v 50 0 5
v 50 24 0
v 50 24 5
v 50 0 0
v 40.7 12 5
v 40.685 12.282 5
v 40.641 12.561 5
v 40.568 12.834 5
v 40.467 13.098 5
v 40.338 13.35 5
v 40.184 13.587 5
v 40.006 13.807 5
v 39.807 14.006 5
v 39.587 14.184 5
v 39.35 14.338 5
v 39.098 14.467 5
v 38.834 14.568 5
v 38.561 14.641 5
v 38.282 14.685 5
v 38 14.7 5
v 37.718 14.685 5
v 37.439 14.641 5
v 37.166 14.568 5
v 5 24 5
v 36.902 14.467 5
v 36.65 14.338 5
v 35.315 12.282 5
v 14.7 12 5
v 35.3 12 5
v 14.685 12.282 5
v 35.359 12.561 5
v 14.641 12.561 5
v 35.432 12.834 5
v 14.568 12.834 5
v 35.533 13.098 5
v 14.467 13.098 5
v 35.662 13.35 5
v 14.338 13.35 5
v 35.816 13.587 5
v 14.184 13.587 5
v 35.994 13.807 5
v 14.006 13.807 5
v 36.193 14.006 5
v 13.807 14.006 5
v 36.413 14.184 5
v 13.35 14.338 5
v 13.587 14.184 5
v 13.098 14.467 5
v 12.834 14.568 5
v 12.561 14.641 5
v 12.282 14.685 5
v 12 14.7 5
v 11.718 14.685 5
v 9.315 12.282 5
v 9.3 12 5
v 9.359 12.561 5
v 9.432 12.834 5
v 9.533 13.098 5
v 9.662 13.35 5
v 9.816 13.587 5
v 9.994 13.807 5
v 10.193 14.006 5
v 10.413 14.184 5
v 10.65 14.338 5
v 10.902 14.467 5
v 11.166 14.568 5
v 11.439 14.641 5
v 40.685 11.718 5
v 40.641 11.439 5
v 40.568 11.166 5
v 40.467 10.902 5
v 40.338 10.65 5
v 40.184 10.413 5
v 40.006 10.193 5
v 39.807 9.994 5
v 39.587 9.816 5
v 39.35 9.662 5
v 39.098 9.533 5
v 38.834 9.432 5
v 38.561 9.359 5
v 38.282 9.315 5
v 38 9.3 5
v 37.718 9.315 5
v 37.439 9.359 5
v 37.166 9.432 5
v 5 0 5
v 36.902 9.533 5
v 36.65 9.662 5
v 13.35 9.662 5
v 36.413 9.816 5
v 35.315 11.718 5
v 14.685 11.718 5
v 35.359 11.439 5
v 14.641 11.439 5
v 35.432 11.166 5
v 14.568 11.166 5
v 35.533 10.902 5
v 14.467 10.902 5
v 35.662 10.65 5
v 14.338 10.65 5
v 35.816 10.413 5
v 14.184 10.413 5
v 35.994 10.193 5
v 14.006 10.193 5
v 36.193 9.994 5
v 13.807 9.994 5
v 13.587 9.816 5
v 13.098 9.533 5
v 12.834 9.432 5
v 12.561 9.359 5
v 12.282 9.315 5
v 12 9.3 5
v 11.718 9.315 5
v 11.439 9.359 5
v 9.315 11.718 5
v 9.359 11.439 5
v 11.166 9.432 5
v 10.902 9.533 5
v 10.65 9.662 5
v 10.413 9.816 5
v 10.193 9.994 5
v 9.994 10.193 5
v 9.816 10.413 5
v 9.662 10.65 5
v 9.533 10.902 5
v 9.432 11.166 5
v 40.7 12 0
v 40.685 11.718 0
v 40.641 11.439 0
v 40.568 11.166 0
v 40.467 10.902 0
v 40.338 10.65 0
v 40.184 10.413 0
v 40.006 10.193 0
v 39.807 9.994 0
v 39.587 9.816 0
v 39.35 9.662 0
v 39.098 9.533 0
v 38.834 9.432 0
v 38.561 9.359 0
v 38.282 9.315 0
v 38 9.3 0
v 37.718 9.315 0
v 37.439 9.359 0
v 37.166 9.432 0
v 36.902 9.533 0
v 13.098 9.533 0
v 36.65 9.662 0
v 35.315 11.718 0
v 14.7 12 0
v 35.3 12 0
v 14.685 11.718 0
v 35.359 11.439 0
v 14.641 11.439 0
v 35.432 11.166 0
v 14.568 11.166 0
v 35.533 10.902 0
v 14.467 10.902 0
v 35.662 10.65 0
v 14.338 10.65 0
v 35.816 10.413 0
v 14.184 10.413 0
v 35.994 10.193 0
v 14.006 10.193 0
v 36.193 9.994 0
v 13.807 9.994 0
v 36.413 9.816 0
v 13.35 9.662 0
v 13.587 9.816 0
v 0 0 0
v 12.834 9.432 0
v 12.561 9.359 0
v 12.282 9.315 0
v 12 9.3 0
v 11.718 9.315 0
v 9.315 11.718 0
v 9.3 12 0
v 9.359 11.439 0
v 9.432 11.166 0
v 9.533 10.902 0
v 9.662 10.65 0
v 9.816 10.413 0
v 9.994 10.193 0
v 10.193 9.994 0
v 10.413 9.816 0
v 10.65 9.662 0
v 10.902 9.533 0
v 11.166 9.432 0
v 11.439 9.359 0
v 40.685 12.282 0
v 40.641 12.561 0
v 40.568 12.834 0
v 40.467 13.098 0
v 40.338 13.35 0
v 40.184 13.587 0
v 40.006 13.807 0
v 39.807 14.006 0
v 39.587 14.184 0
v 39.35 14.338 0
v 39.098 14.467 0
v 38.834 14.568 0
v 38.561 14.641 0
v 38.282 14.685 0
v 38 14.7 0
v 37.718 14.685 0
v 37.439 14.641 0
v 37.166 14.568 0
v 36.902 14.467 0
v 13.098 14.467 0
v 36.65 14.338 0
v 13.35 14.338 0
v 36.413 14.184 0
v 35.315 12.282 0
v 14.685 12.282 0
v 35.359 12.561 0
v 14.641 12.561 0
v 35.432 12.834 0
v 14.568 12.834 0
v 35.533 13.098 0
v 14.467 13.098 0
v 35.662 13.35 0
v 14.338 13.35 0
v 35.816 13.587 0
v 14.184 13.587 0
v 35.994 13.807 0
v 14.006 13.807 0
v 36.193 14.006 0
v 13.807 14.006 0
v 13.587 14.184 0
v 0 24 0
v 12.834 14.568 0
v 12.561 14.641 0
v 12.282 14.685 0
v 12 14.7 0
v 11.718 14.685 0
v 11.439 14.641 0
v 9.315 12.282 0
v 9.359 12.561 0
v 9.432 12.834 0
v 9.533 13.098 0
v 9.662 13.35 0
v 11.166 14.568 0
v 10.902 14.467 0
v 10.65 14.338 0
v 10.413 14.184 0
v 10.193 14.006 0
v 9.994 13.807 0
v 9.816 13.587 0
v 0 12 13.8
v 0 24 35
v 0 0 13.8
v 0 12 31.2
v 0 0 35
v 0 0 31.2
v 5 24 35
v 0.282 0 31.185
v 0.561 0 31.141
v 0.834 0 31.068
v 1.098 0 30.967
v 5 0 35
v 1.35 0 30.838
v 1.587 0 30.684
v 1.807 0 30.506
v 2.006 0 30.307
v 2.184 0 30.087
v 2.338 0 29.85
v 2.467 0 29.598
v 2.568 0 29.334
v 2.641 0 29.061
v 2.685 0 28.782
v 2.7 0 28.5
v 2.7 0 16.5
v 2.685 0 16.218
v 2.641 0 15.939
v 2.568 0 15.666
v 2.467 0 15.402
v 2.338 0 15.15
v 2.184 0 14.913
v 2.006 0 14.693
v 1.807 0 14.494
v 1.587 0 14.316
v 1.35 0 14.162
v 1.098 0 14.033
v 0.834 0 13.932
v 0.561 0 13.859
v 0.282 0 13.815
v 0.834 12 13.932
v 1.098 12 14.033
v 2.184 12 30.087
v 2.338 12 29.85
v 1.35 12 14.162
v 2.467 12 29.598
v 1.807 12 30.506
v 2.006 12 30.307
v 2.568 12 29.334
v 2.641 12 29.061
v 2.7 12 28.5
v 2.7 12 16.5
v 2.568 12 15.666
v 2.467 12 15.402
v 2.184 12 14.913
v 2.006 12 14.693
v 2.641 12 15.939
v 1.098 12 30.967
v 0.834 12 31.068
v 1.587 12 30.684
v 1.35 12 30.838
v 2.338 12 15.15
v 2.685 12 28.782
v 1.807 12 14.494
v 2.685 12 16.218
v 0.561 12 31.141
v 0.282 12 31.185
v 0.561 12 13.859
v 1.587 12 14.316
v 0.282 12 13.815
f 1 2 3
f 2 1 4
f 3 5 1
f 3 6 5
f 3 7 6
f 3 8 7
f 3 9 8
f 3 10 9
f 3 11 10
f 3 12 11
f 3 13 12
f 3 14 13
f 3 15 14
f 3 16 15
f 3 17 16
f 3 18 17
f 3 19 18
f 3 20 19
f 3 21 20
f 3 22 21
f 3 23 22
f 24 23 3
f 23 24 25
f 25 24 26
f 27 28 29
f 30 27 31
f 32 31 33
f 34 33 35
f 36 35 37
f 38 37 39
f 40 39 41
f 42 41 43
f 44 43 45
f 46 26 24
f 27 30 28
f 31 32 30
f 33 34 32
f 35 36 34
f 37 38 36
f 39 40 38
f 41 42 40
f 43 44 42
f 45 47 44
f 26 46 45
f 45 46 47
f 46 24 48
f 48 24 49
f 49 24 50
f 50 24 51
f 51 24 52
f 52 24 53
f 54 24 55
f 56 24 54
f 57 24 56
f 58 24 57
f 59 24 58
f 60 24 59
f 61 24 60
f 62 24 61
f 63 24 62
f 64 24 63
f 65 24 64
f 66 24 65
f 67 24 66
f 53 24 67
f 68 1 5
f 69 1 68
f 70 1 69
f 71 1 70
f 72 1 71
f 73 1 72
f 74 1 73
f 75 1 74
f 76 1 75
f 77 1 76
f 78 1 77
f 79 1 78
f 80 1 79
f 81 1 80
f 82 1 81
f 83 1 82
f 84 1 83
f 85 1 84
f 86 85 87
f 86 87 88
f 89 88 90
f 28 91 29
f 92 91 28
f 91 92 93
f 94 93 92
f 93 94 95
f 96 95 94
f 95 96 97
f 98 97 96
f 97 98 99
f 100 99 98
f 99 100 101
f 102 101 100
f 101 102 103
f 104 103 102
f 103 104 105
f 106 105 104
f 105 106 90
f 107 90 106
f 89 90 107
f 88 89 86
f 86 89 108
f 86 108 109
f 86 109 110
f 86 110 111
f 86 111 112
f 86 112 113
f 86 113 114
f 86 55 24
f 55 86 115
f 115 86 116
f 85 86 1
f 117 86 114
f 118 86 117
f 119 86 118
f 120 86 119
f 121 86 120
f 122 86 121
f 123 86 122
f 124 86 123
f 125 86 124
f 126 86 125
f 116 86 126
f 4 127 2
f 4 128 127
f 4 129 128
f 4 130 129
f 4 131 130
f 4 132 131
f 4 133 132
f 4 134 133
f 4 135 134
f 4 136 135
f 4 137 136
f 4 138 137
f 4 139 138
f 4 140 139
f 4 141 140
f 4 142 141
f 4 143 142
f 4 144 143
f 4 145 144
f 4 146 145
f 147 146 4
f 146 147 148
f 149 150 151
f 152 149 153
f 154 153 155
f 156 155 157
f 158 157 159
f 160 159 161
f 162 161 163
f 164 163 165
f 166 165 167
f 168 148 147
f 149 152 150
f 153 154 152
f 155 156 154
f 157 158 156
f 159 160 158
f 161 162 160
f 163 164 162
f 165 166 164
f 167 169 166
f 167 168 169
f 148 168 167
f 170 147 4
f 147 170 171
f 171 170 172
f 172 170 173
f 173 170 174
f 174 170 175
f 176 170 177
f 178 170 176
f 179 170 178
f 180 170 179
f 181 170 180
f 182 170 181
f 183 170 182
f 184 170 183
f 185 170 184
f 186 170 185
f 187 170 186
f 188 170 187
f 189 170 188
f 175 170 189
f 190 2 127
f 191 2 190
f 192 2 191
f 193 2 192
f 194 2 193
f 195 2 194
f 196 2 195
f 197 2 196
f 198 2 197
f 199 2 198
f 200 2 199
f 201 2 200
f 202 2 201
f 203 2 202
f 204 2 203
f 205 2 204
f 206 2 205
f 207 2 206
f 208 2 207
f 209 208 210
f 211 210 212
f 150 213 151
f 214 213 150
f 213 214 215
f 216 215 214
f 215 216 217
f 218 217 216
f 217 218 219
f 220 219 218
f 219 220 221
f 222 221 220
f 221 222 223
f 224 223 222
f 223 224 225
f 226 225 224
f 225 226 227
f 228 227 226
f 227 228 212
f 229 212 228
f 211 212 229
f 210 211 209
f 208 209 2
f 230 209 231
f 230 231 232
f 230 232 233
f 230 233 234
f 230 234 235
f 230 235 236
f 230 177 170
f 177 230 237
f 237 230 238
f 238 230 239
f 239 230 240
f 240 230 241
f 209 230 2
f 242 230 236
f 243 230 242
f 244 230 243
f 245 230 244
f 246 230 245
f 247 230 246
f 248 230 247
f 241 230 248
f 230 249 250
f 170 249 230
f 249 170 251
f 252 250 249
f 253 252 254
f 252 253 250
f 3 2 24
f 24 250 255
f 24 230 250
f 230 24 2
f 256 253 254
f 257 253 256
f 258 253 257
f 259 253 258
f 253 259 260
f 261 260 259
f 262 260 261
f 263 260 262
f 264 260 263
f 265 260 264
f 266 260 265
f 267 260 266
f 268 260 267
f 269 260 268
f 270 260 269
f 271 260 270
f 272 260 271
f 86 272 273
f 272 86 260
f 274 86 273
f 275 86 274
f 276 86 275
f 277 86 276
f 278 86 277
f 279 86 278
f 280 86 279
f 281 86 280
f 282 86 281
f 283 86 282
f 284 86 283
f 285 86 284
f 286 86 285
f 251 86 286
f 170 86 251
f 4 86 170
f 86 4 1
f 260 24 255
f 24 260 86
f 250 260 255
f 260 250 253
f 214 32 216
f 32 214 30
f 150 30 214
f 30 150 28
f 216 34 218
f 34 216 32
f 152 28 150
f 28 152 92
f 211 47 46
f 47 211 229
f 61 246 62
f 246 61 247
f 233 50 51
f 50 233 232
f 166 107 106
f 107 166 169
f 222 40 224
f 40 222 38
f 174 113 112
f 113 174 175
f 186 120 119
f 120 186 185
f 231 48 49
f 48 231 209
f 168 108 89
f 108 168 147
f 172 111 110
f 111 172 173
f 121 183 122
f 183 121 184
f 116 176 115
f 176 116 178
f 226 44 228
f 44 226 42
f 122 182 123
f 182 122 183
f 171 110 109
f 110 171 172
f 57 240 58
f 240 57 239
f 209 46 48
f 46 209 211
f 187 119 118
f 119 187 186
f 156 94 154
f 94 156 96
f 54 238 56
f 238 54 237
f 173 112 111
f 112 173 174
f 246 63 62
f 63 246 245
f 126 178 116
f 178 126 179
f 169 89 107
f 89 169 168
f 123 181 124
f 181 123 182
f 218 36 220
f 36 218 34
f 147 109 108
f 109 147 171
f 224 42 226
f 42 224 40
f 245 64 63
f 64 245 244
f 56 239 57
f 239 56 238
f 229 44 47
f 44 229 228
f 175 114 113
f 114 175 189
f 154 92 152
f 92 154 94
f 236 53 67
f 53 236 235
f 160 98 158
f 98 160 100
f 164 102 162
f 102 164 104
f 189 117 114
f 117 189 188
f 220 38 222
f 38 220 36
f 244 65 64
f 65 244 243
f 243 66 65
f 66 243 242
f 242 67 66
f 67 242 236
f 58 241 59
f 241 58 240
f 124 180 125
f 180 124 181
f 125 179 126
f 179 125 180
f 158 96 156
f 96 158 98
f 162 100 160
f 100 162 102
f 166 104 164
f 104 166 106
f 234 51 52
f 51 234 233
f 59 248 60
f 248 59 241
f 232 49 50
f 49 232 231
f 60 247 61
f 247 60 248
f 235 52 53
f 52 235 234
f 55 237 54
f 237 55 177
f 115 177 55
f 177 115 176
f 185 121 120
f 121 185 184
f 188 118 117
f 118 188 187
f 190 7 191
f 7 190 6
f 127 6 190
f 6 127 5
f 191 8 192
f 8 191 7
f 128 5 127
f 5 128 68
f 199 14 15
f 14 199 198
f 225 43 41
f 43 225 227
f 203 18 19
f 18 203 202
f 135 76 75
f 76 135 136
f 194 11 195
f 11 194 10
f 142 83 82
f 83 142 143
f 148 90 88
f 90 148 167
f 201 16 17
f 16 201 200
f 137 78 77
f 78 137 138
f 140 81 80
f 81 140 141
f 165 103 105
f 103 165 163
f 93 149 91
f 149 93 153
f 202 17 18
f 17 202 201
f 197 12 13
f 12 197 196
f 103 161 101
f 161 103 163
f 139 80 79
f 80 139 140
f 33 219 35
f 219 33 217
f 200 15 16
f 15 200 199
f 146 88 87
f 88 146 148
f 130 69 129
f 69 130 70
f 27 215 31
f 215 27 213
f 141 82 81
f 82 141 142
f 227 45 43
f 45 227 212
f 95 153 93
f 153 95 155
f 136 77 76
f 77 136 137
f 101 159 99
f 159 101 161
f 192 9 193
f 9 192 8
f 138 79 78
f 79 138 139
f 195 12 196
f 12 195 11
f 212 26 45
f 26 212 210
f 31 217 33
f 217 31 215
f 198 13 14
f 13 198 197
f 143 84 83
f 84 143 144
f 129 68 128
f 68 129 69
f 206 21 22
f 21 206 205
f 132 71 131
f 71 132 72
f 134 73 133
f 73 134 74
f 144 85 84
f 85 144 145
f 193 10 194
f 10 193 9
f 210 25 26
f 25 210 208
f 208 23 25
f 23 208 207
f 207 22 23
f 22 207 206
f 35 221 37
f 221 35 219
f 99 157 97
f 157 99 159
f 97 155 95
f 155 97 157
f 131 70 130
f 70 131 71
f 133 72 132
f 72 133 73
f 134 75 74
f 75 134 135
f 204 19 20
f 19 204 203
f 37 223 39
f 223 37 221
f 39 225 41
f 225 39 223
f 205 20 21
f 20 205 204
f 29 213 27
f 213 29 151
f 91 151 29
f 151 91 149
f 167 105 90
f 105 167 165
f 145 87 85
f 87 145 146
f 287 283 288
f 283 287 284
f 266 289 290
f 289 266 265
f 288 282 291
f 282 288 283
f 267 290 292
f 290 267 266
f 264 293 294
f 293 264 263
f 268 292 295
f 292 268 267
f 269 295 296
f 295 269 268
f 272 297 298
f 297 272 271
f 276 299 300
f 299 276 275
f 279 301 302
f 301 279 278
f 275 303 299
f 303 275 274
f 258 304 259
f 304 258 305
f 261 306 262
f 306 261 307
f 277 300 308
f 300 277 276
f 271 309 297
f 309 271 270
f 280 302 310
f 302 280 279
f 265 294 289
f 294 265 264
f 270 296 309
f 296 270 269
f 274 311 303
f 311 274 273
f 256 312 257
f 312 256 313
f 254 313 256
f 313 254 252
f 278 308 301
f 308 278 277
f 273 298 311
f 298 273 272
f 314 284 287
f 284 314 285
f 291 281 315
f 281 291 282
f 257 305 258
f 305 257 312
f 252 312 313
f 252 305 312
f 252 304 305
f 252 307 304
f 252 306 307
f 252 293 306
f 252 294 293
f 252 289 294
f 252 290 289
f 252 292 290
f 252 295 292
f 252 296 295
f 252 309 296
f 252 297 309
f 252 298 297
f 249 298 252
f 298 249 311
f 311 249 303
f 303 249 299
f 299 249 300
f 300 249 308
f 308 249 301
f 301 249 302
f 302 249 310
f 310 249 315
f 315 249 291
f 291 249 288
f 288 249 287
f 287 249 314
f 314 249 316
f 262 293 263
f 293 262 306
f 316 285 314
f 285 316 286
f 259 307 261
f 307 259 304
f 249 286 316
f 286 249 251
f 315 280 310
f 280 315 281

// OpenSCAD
// Adjustable L bracket with upright slot.
$fn = 60;
eps = 0.02;
base_l = 50;
upright_h = 35;
width = 24;
thickness = 5;
slot_l = 12;
module vertical_slot() { hull() { translate([0,width/2,thickness+upright_h/2-slot_l/2]) rotate([90,0,0]) cylinder(d=5.4,h=width+2*eps); translate([0,width/2,thickness+upright_h/2+slot_l/2]) rotate([90,0,0]) cylinder(d=5.4,h=width+2*eps); } }
difference() {
    union() { cube([base_l,width,thickness]); cube([thickness,width,upright_h]); }
    for(x=[12,base_l-12]) translate([x,width/2,-eps]) cylinder(d=5.4,h=thickness+2*eps);
    vertical_slot();
}
